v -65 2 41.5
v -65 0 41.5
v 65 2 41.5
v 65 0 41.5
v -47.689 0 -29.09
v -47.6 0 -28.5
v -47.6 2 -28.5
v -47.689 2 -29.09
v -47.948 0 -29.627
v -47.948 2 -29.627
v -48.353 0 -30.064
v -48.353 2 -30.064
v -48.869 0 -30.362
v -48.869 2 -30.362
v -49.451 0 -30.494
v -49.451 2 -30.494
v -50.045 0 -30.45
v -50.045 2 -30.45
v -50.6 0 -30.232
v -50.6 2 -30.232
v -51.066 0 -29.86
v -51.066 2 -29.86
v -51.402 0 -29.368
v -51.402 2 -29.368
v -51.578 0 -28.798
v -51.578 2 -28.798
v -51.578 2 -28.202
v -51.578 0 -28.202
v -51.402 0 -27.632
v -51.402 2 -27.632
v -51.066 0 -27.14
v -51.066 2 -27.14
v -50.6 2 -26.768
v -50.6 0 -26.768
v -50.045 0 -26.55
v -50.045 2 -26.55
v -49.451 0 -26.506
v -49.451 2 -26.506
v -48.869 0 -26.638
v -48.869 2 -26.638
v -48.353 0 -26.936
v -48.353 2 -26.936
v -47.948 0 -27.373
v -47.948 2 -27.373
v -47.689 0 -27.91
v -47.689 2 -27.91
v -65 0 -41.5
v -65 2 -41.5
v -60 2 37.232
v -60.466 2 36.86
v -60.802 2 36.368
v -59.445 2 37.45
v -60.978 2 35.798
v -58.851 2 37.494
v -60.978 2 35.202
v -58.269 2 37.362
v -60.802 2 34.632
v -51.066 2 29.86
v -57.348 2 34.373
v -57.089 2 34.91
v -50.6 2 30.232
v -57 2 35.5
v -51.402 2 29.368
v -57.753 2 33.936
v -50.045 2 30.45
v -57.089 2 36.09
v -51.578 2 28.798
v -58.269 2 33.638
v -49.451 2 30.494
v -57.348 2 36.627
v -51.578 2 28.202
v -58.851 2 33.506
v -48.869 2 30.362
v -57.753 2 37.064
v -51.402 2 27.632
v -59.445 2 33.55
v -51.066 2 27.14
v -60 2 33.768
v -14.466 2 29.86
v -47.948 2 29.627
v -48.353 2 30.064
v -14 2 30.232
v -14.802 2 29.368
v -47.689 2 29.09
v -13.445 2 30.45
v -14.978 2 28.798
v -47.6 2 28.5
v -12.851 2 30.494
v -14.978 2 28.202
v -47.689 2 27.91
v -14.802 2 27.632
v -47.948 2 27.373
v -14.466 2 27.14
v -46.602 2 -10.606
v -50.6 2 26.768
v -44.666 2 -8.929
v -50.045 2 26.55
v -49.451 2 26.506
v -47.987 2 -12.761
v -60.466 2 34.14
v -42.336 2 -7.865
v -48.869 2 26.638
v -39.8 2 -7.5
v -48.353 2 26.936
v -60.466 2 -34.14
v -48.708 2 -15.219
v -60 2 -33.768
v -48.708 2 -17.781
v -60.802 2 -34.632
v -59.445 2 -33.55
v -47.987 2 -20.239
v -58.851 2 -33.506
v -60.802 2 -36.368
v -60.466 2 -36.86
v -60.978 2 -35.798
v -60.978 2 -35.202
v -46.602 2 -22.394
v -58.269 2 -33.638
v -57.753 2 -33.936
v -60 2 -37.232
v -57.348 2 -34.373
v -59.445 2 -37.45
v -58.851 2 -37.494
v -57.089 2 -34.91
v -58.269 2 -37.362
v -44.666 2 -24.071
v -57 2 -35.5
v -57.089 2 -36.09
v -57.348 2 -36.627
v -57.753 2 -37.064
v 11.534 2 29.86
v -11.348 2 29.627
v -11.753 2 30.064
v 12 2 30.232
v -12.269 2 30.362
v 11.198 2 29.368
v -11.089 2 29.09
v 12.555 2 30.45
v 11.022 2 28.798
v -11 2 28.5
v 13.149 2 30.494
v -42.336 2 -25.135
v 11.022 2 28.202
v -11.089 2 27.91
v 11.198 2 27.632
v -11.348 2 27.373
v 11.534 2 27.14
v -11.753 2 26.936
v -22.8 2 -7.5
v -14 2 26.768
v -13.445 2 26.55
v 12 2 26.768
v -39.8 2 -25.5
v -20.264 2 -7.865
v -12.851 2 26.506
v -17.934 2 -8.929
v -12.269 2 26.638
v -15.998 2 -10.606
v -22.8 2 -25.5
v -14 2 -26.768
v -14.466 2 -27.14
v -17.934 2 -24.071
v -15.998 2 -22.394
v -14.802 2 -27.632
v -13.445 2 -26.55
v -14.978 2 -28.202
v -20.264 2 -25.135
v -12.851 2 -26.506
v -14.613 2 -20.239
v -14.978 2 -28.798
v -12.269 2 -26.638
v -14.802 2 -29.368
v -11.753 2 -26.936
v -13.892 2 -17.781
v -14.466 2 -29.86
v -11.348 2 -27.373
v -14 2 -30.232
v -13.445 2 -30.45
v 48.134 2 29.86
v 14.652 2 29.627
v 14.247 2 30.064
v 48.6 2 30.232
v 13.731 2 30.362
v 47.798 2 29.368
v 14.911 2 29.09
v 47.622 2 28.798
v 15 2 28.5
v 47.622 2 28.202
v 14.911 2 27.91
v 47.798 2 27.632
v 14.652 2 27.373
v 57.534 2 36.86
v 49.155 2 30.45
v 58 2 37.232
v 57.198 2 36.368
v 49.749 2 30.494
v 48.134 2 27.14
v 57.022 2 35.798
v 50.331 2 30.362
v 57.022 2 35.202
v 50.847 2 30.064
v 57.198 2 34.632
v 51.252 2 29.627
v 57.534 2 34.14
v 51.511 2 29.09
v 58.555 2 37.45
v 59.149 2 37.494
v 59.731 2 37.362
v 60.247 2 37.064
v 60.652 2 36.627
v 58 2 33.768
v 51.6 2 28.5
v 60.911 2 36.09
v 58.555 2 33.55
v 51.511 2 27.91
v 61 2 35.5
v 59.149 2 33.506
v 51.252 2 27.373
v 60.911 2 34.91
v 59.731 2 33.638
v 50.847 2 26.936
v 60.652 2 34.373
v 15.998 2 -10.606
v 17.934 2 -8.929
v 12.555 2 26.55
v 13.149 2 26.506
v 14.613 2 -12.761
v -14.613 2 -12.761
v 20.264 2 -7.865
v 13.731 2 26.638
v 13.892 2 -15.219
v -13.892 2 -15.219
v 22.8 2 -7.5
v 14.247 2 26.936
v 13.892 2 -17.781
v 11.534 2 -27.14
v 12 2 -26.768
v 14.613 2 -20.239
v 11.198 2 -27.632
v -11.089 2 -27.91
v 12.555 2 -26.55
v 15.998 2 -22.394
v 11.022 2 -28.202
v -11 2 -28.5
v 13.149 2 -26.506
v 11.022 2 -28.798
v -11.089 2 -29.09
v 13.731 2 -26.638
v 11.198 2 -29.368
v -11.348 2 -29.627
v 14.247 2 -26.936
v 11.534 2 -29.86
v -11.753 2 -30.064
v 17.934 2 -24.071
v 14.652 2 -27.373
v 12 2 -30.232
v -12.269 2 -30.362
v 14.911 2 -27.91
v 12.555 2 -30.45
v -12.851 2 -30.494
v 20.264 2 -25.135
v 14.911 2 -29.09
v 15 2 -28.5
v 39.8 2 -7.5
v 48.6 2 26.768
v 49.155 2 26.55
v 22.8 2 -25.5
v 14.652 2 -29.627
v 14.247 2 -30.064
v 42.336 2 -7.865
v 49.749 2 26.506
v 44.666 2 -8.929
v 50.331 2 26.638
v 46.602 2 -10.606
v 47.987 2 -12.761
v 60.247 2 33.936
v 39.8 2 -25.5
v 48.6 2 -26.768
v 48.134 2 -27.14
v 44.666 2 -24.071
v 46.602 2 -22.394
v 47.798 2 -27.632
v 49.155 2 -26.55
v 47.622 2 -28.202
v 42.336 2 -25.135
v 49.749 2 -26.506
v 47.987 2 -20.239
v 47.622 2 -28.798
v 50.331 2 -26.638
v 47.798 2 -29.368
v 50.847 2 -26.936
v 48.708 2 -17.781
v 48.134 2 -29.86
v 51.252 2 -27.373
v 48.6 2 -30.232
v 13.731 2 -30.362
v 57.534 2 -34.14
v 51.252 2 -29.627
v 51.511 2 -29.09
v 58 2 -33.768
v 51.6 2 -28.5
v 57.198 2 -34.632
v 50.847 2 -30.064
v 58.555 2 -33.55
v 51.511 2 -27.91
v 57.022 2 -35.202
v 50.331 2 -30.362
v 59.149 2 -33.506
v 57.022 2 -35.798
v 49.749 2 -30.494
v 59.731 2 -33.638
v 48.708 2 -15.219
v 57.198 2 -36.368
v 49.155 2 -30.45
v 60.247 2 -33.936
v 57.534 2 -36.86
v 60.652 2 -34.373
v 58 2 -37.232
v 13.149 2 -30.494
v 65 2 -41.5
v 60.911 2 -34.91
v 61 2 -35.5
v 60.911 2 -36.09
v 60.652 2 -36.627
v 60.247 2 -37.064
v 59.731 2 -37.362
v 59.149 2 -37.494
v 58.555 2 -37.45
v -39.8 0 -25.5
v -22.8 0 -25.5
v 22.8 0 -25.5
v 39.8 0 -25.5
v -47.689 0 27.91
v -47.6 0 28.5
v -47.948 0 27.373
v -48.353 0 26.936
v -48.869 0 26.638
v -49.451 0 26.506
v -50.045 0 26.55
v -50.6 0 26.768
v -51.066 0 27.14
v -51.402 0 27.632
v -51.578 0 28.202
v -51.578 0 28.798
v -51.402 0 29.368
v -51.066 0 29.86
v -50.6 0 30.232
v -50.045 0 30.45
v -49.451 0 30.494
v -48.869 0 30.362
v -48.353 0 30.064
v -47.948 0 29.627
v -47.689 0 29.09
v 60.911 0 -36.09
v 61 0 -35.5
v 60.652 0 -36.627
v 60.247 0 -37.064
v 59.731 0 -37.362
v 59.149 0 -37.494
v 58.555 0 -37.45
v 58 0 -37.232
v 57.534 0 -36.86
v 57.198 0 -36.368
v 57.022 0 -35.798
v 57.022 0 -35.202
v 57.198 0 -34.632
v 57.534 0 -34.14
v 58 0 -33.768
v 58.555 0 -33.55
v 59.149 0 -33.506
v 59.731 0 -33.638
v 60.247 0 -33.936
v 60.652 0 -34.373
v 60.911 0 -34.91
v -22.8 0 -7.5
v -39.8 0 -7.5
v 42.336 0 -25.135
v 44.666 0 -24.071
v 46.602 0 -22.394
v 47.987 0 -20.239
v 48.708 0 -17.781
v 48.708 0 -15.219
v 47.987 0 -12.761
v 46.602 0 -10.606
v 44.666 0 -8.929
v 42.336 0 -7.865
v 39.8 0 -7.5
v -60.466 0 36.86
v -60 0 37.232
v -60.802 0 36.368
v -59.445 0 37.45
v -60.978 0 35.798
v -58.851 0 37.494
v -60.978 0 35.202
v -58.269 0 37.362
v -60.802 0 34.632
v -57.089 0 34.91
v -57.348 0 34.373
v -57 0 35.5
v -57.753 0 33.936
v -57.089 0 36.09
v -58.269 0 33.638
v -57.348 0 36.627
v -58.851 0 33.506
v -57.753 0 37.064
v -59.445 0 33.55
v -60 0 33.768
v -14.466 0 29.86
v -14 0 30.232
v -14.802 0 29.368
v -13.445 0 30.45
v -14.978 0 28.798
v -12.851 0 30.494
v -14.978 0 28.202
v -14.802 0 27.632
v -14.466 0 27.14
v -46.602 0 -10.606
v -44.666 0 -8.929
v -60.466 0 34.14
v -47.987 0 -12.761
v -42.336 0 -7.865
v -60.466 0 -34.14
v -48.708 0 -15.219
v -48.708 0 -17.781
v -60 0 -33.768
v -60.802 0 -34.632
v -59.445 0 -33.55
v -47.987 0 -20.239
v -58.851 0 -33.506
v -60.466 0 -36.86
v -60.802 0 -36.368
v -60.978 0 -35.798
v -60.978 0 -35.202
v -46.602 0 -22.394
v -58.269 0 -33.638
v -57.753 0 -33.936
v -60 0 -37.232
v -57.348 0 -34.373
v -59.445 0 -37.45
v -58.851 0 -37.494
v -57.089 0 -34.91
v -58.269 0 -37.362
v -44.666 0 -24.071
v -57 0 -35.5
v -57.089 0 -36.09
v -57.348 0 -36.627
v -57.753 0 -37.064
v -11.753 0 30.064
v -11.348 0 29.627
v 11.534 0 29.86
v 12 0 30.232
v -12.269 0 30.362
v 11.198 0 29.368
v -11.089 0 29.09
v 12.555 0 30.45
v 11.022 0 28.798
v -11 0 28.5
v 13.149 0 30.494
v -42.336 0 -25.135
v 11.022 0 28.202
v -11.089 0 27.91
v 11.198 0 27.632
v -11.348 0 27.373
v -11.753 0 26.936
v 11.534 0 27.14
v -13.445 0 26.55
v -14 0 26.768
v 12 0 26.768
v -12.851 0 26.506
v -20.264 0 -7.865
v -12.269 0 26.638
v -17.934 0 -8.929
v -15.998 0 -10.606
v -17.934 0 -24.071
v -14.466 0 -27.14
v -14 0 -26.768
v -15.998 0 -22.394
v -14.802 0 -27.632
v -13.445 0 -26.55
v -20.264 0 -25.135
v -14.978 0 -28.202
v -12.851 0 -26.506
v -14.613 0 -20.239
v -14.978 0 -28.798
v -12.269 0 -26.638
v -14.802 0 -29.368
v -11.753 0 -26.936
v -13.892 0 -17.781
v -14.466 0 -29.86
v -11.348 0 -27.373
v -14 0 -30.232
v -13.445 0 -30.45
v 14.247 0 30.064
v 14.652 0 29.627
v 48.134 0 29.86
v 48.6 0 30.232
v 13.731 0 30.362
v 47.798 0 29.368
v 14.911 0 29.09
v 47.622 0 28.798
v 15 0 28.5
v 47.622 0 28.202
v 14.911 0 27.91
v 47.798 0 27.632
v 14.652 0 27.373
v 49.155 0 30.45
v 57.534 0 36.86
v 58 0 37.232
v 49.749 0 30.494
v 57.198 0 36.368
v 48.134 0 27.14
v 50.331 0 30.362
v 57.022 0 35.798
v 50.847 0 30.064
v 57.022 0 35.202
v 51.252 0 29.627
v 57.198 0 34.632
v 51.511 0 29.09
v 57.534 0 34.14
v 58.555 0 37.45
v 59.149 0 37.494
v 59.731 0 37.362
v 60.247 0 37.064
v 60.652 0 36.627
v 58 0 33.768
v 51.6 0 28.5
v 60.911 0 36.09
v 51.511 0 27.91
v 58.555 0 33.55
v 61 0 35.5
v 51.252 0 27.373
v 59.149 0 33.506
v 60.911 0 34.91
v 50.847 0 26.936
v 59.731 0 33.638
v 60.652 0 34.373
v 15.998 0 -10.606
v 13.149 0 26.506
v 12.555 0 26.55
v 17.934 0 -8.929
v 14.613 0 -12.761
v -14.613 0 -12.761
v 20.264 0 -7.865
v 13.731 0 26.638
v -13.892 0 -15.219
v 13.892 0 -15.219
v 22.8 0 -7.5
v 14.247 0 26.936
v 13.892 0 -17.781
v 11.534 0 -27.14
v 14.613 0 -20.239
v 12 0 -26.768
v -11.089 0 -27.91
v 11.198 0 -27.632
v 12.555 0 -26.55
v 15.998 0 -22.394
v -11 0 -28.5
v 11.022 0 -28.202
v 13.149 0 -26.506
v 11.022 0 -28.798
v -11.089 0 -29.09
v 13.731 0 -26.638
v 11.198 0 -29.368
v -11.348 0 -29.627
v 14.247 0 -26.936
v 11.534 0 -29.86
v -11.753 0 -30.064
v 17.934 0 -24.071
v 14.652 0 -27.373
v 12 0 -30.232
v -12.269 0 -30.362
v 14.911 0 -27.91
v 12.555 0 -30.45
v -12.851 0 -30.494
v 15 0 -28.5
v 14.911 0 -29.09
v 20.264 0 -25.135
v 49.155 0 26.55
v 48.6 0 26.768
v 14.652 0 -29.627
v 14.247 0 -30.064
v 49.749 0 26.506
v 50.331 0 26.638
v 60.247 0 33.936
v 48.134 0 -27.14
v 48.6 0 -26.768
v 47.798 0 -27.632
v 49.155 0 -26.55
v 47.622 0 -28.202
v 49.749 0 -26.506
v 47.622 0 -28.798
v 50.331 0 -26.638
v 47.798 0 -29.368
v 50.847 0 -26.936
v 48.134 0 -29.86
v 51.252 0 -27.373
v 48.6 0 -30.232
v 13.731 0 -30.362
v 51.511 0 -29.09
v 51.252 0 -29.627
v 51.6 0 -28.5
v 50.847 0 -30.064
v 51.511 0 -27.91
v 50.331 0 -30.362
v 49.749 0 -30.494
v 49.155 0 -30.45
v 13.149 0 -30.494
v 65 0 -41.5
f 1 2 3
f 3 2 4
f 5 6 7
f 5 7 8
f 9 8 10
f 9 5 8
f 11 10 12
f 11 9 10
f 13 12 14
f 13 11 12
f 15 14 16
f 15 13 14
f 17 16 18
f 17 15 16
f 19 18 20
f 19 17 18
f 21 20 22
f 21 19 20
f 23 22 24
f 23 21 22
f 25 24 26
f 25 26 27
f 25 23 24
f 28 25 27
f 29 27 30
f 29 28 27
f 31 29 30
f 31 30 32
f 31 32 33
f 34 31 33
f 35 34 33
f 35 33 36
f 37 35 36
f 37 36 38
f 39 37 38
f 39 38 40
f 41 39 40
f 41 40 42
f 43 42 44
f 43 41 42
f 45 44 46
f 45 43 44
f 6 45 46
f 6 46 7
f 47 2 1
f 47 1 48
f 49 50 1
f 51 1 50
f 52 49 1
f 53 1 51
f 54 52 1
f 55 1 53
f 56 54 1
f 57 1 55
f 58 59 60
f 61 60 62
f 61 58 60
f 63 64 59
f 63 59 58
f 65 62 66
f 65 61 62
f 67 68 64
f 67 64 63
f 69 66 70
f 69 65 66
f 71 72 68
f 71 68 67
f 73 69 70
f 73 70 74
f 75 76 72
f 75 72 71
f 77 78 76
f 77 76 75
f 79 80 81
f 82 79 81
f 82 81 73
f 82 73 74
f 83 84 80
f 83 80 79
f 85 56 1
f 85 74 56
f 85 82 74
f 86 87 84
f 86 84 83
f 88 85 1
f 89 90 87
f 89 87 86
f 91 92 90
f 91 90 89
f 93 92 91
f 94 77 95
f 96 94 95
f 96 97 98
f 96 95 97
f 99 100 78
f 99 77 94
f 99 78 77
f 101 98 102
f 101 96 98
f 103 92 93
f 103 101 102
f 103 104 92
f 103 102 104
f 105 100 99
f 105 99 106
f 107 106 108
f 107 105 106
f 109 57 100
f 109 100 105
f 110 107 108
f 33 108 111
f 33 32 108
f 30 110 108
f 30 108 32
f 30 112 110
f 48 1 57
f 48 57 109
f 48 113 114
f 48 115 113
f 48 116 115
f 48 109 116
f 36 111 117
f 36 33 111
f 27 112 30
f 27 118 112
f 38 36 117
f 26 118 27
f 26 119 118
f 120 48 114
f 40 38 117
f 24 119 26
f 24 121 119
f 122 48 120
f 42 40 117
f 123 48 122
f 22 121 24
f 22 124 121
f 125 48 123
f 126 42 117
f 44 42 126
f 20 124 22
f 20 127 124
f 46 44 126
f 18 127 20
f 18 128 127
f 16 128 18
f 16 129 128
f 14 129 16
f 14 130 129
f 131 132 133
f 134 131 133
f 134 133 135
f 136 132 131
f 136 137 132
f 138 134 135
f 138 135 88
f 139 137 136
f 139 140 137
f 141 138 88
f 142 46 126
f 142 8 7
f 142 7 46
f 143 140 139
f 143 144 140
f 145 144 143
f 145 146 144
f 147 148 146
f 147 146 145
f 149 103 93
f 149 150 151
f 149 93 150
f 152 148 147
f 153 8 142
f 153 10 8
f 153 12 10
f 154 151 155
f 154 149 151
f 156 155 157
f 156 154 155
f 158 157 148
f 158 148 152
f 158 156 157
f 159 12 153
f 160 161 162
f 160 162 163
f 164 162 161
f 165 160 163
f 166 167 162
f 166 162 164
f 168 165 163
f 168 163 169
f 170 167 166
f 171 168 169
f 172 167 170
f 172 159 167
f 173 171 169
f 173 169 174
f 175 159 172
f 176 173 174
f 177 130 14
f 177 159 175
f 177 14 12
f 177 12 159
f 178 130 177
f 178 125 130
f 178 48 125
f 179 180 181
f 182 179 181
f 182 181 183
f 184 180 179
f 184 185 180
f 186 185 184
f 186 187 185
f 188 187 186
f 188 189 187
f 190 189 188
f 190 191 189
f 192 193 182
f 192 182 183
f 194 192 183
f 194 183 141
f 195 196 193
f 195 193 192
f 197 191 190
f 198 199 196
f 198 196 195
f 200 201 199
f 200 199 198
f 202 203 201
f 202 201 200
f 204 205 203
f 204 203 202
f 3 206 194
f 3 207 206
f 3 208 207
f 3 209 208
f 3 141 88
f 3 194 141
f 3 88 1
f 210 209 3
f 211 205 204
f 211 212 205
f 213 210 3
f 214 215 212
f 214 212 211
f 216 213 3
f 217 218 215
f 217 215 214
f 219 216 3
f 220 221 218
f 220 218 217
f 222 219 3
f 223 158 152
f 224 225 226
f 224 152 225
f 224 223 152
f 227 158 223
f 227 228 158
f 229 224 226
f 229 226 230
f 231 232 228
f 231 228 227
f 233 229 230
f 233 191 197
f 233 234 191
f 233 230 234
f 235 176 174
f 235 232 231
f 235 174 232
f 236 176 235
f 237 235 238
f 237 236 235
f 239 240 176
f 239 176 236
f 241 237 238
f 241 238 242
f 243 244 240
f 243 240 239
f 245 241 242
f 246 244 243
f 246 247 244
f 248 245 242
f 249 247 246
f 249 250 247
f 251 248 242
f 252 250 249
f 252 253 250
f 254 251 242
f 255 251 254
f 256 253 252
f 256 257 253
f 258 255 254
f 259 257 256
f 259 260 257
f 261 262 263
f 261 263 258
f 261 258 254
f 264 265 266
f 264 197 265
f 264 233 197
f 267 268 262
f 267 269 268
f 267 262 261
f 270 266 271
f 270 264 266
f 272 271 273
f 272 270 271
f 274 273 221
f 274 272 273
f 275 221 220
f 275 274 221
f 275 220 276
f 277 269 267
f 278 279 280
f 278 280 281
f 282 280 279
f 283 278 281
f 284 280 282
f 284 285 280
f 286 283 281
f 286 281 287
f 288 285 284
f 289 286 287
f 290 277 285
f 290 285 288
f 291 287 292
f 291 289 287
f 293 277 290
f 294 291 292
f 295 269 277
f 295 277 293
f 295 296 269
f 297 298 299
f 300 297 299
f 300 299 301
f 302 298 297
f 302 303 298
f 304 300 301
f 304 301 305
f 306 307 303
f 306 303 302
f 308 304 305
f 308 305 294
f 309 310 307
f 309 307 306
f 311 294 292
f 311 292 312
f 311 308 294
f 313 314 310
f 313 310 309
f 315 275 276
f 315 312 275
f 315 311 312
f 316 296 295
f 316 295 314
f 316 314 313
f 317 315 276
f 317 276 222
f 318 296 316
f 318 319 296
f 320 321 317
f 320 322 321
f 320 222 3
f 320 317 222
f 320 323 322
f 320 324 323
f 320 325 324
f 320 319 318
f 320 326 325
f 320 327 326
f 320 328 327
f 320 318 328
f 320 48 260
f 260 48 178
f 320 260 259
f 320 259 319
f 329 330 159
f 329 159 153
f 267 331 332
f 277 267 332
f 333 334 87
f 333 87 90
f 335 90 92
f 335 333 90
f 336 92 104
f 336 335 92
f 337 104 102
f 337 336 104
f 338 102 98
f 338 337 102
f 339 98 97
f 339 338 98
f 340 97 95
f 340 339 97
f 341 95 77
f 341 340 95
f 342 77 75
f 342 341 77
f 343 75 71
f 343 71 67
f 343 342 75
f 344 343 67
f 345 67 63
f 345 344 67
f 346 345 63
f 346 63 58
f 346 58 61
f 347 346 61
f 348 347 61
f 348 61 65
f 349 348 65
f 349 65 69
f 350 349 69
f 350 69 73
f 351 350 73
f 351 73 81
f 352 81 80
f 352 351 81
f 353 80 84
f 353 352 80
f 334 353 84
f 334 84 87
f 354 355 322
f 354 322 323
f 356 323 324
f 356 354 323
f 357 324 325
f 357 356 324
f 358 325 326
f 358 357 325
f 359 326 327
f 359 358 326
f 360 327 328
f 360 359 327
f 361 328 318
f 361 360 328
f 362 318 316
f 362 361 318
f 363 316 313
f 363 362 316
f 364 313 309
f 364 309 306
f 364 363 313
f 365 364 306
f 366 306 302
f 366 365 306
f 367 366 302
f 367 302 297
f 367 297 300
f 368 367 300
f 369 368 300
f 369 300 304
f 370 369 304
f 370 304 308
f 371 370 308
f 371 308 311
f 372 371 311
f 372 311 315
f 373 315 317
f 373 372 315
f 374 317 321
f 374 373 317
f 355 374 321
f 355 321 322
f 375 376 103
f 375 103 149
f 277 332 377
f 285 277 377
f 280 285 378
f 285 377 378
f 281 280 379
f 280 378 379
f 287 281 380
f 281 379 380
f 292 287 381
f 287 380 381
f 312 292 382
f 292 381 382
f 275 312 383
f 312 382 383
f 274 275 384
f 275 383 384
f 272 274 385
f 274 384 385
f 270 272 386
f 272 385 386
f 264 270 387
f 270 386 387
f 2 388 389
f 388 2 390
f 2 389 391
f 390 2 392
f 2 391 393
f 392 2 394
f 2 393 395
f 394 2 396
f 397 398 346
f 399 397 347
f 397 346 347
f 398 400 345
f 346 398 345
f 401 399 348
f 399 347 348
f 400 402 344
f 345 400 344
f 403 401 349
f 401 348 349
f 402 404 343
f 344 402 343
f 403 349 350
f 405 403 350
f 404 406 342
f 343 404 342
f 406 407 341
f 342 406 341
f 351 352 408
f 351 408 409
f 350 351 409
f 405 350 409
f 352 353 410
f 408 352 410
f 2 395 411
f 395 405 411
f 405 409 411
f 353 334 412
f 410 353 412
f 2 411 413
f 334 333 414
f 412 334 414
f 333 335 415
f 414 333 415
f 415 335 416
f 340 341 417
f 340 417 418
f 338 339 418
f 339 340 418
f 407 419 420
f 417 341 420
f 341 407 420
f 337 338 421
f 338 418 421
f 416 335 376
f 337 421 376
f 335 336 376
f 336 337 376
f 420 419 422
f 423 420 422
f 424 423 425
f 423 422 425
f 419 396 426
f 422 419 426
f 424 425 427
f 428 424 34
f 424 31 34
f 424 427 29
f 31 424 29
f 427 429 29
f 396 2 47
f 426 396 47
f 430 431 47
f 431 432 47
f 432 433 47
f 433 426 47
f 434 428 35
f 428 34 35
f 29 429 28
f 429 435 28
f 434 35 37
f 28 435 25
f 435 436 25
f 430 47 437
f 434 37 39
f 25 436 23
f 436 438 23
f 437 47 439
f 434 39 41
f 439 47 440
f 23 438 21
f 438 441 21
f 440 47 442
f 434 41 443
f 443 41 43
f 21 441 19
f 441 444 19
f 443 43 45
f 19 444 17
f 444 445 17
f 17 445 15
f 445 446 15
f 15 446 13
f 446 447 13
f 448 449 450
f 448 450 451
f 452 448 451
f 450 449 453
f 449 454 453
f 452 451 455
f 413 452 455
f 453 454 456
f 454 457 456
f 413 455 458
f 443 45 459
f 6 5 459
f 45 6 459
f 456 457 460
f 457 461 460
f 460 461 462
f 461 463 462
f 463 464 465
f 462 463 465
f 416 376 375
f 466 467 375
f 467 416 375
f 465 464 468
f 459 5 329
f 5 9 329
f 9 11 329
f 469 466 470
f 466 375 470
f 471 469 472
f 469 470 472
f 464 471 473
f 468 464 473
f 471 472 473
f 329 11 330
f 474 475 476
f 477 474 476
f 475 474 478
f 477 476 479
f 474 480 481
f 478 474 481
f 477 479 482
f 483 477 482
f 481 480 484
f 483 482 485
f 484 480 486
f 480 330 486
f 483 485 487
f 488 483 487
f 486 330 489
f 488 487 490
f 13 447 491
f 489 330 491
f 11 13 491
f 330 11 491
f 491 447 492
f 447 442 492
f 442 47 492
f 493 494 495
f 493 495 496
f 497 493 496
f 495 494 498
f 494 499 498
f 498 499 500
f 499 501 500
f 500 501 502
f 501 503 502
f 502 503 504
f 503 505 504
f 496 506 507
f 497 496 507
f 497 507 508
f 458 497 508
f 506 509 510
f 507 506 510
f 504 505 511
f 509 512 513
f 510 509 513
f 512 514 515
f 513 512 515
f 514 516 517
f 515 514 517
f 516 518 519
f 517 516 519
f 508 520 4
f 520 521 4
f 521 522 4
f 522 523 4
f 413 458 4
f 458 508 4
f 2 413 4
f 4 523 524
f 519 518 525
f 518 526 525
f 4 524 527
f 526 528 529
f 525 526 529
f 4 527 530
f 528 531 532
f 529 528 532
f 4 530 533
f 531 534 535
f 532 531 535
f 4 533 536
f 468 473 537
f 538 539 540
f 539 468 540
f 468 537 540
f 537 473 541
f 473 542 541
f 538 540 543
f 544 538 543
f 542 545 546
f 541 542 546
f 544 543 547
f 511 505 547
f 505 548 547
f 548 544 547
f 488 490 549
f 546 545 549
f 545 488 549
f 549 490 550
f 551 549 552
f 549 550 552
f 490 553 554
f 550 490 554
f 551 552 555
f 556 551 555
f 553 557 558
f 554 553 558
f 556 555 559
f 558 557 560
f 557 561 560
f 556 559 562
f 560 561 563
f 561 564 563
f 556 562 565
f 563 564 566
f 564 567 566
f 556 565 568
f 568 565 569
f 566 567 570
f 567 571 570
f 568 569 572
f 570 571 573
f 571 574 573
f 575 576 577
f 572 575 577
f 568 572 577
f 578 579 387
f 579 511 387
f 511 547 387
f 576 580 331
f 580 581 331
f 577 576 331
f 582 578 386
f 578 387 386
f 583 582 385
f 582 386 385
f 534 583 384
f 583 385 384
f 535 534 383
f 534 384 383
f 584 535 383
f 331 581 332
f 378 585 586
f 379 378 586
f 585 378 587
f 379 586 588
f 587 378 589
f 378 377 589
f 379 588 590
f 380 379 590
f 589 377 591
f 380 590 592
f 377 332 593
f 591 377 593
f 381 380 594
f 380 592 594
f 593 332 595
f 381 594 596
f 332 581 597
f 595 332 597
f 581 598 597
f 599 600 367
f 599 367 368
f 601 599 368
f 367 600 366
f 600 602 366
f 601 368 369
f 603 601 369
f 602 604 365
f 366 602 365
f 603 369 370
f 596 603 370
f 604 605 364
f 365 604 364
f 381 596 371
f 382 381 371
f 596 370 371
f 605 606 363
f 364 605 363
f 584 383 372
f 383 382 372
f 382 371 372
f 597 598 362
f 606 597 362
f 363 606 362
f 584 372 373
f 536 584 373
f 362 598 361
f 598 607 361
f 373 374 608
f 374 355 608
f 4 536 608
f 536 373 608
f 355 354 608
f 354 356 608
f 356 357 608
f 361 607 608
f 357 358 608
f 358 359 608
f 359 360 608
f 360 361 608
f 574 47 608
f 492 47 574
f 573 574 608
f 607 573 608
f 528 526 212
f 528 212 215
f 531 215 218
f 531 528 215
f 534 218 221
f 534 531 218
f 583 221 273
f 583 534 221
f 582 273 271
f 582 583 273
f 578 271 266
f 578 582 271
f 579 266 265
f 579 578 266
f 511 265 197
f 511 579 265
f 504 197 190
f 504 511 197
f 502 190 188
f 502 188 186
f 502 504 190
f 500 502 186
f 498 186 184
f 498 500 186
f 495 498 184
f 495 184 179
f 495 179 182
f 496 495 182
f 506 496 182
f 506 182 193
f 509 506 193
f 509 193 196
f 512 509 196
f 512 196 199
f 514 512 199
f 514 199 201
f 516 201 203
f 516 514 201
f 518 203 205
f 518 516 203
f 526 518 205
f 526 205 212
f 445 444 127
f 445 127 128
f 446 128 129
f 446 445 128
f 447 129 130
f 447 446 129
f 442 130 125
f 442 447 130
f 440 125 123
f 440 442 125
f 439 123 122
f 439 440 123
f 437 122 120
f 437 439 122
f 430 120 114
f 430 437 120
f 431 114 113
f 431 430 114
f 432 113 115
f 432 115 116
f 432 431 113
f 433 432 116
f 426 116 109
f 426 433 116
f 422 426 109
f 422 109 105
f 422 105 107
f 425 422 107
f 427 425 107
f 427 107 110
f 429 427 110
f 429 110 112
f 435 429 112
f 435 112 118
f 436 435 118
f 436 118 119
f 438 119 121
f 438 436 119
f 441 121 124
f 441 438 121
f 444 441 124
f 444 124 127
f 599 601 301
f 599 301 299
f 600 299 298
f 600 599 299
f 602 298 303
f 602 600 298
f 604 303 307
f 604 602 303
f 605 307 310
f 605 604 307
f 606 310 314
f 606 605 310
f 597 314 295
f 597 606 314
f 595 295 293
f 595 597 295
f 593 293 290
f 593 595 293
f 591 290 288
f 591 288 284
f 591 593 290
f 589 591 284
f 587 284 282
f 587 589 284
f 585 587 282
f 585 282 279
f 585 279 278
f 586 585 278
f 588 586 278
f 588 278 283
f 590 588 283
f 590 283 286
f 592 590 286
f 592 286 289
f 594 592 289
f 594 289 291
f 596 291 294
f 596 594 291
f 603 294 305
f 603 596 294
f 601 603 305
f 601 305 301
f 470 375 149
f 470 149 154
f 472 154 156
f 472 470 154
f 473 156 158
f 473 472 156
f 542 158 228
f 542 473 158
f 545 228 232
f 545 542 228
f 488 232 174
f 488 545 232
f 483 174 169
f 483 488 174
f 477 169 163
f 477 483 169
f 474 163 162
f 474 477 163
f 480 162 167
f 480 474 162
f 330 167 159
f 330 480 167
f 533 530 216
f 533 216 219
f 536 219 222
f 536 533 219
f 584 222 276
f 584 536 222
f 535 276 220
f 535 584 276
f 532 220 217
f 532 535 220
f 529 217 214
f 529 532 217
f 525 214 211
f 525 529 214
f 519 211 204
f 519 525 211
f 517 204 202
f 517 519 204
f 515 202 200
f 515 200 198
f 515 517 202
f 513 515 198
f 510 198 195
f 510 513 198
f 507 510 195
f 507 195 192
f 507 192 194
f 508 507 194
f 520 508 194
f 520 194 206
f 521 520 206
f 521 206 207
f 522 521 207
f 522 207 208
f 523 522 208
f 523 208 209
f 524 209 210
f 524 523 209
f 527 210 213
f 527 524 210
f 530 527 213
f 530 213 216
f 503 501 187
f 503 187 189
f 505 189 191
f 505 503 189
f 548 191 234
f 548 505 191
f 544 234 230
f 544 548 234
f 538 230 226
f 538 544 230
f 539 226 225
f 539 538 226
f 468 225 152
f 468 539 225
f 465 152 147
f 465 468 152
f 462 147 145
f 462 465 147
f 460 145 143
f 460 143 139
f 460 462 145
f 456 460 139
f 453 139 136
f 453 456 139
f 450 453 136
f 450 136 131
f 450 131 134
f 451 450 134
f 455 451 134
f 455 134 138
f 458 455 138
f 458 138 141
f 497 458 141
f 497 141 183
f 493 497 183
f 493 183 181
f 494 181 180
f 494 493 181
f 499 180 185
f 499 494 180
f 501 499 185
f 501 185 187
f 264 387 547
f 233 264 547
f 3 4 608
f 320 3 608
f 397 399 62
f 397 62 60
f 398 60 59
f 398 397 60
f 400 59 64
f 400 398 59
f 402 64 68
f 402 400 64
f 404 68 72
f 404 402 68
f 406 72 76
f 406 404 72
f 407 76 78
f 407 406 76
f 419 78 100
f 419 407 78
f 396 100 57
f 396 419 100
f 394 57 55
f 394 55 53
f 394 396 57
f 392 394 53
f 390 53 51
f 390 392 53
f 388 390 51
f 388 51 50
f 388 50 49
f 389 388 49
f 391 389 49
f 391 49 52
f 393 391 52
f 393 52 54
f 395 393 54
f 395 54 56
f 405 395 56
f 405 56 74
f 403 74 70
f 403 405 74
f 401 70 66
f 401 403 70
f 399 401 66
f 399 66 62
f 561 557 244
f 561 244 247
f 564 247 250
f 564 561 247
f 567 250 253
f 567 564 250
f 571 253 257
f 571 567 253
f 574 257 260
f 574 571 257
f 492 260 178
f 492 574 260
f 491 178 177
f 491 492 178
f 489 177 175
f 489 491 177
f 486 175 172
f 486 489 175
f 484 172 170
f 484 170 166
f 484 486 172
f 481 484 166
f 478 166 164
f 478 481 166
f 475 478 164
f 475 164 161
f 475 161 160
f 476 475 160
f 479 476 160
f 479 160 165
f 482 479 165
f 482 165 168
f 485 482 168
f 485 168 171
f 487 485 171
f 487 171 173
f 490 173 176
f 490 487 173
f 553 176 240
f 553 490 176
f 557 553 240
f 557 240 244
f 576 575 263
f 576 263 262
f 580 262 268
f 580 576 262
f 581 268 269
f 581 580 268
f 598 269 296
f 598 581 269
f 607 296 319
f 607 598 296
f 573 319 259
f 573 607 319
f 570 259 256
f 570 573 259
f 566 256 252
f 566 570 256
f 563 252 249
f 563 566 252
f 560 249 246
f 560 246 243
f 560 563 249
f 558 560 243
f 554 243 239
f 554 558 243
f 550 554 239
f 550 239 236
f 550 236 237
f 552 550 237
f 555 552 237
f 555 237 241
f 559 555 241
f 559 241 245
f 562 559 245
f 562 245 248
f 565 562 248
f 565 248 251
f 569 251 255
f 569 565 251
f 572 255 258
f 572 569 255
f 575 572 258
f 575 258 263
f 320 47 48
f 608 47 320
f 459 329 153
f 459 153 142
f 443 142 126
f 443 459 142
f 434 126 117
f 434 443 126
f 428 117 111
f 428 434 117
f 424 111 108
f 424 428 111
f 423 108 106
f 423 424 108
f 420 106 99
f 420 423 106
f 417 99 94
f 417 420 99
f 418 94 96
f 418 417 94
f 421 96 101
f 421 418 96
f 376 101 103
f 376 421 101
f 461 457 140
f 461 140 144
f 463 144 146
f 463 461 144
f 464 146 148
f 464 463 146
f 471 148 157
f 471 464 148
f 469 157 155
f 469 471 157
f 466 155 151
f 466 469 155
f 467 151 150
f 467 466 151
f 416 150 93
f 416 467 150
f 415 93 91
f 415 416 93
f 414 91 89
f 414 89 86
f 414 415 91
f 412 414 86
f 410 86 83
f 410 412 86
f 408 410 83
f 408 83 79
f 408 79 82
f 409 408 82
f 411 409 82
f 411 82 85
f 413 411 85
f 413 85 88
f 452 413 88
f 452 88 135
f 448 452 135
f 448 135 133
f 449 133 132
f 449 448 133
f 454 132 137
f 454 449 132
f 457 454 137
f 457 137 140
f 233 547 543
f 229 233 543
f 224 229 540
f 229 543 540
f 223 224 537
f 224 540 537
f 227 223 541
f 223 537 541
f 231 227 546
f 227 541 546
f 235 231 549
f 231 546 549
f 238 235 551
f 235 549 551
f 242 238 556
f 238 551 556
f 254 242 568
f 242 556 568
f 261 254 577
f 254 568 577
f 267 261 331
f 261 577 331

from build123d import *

# Parameters (mm, degrees)
SKETCH1_W           = 130
SKETCH1_H           = 83
SKETCH1_R           = 2
BOSS_EXTRUDE1_DEPTH = 2


with BuildPart() as part:
    # Sketch1 → Boss-Extrude1 (new body)
    with BuildSketch(Plane(origin=(0, 0, 0), x_dir=(1, 0, 0), z_dir=(0, 1, 0))):
        Rectangle(SKETCH1_W, SKETCH1_H)
        with Locations((13, 28.5)):
            Circle(SKETCH1_R, mode=Mode.SUBTRACT)
        with Locations((49.6, 28.5)):
            Circle(SKETCH1_R, mode=Mode.SUBTRACT)
        with Locations((49.6, -28.5)):
            Circle(SKETCH1_R, mode=Mode.SUBTRACT)
        with Locations((13, -28.5)):
            Circle(SKETCH1_R, mode=Mode.SUBTRACT)
        with Locations((-13, -28.5)):
            Circle(SKETCH1_R, mode=Mode.SUBTRACT)
        with Locations((-49.6, -28.5)):
            Circle(SKETCH1_R, mode=Mode.SUBTRACT)
        with Locations((-49.6, 28.5)):
            Circle(SKETCH1_R, mode=Mode.SUBTRACT)
        with Locations((-13, 28.5)):
            Circle(SKETCH1_R, mode=Mode.SUBTRACT)
        with Locations((-59, 35.5)):
            Circle(SKETCH1_R, mode=Mode.SUBTRACT)
        with Locations((59, 35.5)):
            Circle(SKETCH1_R, mode=Mode.SUBTRACT)
        with Locations((59, -35.5)):
            Circle(SKETCH1_R, mode=Mode.SUBTRACT)
        with Locations((-59, -35.5)):
            Circle(SKETCH1_R, mode=Mode.SUBTRACT)
        with BuildLine():
            Line((22.8, 25.5), (39.8, 25.5))
            ThreePointArc((39.8, 25.5), (48.8, 16.5), (39.8, 7.5))
            Line((39.8, 7.5), (22.8, 7.5))
            ThreePointArc((22.8, 7.5), (13.8, 16.5), (22.8, 25.5))
        make_face(mode=Mode.SUBTRACT)
        with BuildLine():
            Line((-22.8, 25.5), (-39.8, 25.5))
            ThreePointArc((-39.8, 25.5), (-48.8, 16.5), (-39.8, 7.5))
            Line((-39.8, 7.5), (-22.8, 7.5))
            ThreePointArc((-22.8, 7.5), (-13.8, 16.5), (-22.8, 25.5))
        make_face(mode=Mode.SUBTRACT)
    extrude(amount=BOSS_EXTRUDE1_DEPTH)


solid = part.part
